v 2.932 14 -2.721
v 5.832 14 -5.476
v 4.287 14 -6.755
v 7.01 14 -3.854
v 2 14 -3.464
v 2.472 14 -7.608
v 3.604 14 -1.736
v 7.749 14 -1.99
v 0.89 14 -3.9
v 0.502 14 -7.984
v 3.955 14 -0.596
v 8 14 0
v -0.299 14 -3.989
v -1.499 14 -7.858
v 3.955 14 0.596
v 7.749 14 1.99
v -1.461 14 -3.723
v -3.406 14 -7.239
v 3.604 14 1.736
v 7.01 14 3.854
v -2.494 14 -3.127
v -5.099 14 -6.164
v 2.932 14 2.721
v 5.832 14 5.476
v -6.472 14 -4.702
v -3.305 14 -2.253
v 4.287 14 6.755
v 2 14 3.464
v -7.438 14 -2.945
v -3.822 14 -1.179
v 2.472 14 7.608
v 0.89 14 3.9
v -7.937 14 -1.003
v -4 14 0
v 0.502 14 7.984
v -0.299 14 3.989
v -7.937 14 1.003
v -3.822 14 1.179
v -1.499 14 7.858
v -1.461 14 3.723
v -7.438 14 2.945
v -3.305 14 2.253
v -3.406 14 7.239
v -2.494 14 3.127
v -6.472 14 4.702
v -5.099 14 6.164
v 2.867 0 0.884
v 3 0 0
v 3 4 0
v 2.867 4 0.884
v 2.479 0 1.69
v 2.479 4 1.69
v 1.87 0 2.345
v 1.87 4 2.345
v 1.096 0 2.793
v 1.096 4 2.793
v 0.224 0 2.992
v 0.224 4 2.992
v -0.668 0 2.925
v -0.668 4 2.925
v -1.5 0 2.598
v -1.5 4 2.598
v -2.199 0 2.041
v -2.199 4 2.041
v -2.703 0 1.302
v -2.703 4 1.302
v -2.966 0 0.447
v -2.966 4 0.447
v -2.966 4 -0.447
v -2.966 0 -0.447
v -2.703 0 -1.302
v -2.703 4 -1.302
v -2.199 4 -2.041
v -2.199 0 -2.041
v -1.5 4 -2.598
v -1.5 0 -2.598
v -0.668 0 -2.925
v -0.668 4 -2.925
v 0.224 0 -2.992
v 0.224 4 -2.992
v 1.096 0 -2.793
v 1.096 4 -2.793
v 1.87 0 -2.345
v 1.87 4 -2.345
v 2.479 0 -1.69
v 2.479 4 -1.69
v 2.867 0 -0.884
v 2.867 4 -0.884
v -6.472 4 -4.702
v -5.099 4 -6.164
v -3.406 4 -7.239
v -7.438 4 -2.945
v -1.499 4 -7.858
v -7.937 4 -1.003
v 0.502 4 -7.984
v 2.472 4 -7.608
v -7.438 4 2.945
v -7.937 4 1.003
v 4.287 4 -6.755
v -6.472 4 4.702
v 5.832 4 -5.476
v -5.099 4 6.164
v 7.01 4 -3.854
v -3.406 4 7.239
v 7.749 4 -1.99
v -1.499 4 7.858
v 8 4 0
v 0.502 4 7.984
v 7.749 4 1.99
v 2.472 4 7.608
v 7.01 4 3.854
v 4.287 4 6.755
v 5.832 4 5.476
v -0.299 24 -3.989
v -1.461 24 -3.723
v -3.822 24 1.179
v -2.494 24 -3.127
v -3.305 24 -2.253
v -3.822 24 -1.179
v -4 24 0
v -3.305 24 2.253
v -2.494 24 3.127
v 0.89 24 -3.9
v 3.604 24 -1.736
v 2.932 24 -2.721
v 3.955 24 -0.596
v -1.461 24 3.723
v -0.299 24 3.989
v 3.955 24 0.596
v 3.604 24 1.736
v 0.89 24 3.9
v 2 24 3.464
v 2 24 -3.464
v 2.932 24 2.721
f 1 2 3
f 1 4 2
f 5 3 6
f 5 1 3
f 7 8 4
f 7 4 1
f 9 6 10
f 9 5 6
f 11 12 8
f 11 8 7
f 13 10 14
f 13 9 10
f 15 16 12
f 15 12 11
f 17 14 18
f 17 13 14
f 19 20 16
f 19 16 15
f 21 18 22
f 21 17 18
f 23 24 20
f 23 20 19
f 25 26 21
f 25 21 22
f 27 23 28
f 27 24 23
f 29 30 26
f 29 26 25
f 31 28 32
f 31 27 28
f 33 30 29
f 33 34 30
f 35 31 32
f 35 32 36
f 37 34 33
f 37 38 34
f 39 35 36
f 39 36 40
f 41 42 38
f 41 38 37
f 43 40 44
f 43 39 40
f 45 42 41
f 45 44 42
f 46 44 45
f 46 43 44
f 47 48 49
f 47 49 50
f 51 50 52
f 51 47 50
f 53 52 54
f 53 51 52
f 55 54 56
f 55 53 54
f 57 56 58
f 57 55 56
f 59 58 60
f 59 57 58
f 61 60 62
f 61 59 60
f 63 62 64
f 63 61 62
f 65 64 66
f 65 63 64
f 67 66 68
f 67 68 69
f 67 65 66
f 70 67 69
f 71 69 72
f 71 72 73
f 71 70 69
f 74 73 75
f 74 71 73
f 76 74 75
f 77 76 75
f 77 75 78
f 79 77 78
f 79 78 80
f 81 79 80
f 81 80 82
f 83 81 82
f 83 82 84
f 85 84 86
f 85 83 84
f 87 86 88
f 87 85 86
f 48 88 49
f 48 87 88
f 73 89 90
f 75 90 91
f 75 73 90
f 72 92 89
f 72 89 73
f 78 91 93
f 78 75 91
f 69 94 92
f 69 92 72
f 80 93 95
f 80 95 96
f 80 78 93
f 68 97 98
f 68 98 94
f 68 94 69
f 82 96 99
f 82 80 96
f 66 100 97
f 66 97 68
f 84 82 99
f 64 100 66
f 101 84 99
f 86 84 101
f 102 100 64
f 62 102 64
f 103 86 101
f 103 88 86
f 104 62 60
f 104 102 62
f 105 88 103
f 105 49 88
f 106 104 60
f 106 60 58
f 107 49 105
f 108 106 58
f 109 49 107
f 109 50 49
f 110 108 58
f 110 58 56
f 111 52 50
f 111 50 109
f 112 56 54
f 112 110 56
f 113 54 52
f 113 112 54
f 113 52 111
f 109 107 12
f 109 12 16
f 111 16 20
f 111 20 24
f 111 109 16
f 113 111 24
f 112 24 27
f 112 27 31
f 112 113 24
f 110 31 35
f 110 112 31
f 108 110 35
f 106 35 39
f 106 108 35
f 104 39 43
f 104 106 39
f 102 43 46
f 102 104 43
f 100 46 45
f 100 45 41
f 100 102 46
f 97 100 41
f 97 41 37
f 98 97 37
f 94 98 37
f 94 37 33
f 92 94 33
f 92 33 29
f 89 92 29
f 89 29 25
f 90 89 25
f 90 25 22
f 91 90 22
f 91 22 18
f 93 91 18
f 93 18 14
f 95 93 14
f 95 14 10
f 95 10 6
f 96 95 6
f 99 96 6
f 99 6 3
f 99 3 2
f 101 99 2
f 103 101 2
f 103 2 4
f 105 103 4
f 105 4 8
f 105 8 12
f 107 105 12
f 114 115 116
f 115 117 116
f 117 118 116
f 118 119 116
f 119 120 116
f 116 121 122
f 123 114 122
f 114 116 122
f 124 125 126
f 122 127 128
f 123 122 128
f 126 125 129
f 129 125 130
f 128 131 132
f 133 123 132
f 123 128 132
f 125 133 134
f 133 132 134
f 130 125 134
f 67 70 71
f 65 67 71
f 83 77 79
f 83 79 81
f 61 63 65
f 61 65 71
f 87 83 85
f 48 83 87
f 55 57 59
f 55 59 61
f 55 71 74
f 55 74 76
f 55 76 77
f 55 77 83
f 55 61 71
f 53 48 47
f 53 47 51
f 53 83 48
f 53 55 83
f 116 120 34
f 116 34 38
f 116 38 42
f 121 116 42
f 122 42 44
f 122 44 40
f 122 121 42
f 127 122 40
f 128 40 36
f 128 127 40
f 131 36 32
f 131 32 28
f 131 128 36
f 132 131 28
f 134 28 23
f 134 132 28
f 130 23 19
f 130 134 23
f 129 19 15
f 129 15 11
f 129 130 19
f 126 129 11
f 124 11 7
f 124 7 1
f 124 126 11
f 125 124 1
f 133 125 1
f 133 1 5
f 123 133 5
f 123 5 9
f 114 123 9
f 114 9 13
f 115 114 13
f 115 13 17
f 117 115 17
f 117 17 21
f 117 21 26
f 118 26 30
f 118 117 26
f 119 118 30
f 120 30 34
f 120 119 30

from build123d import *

# Parameters (mm, degrees)
F0_R     = 8
F1_DEPTH = 24
F2_R     = 12.156752
F2_R_2   = 3
F3_DEPTH = 4
F4_R     = 10.910095
F4_R_2   = 4
F5_DEPTH = 10


with BuildPart() as f1:
    # F0 (on Front) → F1 (new body)
    with BuildSketch(Plane.XZ):
        Circle(F0_R)
    extrude(amount=-F1_DEPTH)

    # F2 (on face) → F3 (cut)
    with BuildSketch(Plane.XZ):
        Circle(F2_R)
        Circle(F2_R_2, mode=Mode.SUBTRACT)
    extrude(amount=-F3_DEPTH, mode=Mode.SUBTRACT)

    # F4 (on face) → F5 (cut)
    with BuildSketch(Plane(origin=(0, 24, 0), x_dir=(-1, 0, 0), z_dir=(0, 1, 0))):
        Circle(F4_R)
        Circle(F4_R_2, mode=Mode.SUBTRACT)
    extrude(amount=-F5_DEPTH, mode=Mode.SUBTRACT)


solid = f1.part
